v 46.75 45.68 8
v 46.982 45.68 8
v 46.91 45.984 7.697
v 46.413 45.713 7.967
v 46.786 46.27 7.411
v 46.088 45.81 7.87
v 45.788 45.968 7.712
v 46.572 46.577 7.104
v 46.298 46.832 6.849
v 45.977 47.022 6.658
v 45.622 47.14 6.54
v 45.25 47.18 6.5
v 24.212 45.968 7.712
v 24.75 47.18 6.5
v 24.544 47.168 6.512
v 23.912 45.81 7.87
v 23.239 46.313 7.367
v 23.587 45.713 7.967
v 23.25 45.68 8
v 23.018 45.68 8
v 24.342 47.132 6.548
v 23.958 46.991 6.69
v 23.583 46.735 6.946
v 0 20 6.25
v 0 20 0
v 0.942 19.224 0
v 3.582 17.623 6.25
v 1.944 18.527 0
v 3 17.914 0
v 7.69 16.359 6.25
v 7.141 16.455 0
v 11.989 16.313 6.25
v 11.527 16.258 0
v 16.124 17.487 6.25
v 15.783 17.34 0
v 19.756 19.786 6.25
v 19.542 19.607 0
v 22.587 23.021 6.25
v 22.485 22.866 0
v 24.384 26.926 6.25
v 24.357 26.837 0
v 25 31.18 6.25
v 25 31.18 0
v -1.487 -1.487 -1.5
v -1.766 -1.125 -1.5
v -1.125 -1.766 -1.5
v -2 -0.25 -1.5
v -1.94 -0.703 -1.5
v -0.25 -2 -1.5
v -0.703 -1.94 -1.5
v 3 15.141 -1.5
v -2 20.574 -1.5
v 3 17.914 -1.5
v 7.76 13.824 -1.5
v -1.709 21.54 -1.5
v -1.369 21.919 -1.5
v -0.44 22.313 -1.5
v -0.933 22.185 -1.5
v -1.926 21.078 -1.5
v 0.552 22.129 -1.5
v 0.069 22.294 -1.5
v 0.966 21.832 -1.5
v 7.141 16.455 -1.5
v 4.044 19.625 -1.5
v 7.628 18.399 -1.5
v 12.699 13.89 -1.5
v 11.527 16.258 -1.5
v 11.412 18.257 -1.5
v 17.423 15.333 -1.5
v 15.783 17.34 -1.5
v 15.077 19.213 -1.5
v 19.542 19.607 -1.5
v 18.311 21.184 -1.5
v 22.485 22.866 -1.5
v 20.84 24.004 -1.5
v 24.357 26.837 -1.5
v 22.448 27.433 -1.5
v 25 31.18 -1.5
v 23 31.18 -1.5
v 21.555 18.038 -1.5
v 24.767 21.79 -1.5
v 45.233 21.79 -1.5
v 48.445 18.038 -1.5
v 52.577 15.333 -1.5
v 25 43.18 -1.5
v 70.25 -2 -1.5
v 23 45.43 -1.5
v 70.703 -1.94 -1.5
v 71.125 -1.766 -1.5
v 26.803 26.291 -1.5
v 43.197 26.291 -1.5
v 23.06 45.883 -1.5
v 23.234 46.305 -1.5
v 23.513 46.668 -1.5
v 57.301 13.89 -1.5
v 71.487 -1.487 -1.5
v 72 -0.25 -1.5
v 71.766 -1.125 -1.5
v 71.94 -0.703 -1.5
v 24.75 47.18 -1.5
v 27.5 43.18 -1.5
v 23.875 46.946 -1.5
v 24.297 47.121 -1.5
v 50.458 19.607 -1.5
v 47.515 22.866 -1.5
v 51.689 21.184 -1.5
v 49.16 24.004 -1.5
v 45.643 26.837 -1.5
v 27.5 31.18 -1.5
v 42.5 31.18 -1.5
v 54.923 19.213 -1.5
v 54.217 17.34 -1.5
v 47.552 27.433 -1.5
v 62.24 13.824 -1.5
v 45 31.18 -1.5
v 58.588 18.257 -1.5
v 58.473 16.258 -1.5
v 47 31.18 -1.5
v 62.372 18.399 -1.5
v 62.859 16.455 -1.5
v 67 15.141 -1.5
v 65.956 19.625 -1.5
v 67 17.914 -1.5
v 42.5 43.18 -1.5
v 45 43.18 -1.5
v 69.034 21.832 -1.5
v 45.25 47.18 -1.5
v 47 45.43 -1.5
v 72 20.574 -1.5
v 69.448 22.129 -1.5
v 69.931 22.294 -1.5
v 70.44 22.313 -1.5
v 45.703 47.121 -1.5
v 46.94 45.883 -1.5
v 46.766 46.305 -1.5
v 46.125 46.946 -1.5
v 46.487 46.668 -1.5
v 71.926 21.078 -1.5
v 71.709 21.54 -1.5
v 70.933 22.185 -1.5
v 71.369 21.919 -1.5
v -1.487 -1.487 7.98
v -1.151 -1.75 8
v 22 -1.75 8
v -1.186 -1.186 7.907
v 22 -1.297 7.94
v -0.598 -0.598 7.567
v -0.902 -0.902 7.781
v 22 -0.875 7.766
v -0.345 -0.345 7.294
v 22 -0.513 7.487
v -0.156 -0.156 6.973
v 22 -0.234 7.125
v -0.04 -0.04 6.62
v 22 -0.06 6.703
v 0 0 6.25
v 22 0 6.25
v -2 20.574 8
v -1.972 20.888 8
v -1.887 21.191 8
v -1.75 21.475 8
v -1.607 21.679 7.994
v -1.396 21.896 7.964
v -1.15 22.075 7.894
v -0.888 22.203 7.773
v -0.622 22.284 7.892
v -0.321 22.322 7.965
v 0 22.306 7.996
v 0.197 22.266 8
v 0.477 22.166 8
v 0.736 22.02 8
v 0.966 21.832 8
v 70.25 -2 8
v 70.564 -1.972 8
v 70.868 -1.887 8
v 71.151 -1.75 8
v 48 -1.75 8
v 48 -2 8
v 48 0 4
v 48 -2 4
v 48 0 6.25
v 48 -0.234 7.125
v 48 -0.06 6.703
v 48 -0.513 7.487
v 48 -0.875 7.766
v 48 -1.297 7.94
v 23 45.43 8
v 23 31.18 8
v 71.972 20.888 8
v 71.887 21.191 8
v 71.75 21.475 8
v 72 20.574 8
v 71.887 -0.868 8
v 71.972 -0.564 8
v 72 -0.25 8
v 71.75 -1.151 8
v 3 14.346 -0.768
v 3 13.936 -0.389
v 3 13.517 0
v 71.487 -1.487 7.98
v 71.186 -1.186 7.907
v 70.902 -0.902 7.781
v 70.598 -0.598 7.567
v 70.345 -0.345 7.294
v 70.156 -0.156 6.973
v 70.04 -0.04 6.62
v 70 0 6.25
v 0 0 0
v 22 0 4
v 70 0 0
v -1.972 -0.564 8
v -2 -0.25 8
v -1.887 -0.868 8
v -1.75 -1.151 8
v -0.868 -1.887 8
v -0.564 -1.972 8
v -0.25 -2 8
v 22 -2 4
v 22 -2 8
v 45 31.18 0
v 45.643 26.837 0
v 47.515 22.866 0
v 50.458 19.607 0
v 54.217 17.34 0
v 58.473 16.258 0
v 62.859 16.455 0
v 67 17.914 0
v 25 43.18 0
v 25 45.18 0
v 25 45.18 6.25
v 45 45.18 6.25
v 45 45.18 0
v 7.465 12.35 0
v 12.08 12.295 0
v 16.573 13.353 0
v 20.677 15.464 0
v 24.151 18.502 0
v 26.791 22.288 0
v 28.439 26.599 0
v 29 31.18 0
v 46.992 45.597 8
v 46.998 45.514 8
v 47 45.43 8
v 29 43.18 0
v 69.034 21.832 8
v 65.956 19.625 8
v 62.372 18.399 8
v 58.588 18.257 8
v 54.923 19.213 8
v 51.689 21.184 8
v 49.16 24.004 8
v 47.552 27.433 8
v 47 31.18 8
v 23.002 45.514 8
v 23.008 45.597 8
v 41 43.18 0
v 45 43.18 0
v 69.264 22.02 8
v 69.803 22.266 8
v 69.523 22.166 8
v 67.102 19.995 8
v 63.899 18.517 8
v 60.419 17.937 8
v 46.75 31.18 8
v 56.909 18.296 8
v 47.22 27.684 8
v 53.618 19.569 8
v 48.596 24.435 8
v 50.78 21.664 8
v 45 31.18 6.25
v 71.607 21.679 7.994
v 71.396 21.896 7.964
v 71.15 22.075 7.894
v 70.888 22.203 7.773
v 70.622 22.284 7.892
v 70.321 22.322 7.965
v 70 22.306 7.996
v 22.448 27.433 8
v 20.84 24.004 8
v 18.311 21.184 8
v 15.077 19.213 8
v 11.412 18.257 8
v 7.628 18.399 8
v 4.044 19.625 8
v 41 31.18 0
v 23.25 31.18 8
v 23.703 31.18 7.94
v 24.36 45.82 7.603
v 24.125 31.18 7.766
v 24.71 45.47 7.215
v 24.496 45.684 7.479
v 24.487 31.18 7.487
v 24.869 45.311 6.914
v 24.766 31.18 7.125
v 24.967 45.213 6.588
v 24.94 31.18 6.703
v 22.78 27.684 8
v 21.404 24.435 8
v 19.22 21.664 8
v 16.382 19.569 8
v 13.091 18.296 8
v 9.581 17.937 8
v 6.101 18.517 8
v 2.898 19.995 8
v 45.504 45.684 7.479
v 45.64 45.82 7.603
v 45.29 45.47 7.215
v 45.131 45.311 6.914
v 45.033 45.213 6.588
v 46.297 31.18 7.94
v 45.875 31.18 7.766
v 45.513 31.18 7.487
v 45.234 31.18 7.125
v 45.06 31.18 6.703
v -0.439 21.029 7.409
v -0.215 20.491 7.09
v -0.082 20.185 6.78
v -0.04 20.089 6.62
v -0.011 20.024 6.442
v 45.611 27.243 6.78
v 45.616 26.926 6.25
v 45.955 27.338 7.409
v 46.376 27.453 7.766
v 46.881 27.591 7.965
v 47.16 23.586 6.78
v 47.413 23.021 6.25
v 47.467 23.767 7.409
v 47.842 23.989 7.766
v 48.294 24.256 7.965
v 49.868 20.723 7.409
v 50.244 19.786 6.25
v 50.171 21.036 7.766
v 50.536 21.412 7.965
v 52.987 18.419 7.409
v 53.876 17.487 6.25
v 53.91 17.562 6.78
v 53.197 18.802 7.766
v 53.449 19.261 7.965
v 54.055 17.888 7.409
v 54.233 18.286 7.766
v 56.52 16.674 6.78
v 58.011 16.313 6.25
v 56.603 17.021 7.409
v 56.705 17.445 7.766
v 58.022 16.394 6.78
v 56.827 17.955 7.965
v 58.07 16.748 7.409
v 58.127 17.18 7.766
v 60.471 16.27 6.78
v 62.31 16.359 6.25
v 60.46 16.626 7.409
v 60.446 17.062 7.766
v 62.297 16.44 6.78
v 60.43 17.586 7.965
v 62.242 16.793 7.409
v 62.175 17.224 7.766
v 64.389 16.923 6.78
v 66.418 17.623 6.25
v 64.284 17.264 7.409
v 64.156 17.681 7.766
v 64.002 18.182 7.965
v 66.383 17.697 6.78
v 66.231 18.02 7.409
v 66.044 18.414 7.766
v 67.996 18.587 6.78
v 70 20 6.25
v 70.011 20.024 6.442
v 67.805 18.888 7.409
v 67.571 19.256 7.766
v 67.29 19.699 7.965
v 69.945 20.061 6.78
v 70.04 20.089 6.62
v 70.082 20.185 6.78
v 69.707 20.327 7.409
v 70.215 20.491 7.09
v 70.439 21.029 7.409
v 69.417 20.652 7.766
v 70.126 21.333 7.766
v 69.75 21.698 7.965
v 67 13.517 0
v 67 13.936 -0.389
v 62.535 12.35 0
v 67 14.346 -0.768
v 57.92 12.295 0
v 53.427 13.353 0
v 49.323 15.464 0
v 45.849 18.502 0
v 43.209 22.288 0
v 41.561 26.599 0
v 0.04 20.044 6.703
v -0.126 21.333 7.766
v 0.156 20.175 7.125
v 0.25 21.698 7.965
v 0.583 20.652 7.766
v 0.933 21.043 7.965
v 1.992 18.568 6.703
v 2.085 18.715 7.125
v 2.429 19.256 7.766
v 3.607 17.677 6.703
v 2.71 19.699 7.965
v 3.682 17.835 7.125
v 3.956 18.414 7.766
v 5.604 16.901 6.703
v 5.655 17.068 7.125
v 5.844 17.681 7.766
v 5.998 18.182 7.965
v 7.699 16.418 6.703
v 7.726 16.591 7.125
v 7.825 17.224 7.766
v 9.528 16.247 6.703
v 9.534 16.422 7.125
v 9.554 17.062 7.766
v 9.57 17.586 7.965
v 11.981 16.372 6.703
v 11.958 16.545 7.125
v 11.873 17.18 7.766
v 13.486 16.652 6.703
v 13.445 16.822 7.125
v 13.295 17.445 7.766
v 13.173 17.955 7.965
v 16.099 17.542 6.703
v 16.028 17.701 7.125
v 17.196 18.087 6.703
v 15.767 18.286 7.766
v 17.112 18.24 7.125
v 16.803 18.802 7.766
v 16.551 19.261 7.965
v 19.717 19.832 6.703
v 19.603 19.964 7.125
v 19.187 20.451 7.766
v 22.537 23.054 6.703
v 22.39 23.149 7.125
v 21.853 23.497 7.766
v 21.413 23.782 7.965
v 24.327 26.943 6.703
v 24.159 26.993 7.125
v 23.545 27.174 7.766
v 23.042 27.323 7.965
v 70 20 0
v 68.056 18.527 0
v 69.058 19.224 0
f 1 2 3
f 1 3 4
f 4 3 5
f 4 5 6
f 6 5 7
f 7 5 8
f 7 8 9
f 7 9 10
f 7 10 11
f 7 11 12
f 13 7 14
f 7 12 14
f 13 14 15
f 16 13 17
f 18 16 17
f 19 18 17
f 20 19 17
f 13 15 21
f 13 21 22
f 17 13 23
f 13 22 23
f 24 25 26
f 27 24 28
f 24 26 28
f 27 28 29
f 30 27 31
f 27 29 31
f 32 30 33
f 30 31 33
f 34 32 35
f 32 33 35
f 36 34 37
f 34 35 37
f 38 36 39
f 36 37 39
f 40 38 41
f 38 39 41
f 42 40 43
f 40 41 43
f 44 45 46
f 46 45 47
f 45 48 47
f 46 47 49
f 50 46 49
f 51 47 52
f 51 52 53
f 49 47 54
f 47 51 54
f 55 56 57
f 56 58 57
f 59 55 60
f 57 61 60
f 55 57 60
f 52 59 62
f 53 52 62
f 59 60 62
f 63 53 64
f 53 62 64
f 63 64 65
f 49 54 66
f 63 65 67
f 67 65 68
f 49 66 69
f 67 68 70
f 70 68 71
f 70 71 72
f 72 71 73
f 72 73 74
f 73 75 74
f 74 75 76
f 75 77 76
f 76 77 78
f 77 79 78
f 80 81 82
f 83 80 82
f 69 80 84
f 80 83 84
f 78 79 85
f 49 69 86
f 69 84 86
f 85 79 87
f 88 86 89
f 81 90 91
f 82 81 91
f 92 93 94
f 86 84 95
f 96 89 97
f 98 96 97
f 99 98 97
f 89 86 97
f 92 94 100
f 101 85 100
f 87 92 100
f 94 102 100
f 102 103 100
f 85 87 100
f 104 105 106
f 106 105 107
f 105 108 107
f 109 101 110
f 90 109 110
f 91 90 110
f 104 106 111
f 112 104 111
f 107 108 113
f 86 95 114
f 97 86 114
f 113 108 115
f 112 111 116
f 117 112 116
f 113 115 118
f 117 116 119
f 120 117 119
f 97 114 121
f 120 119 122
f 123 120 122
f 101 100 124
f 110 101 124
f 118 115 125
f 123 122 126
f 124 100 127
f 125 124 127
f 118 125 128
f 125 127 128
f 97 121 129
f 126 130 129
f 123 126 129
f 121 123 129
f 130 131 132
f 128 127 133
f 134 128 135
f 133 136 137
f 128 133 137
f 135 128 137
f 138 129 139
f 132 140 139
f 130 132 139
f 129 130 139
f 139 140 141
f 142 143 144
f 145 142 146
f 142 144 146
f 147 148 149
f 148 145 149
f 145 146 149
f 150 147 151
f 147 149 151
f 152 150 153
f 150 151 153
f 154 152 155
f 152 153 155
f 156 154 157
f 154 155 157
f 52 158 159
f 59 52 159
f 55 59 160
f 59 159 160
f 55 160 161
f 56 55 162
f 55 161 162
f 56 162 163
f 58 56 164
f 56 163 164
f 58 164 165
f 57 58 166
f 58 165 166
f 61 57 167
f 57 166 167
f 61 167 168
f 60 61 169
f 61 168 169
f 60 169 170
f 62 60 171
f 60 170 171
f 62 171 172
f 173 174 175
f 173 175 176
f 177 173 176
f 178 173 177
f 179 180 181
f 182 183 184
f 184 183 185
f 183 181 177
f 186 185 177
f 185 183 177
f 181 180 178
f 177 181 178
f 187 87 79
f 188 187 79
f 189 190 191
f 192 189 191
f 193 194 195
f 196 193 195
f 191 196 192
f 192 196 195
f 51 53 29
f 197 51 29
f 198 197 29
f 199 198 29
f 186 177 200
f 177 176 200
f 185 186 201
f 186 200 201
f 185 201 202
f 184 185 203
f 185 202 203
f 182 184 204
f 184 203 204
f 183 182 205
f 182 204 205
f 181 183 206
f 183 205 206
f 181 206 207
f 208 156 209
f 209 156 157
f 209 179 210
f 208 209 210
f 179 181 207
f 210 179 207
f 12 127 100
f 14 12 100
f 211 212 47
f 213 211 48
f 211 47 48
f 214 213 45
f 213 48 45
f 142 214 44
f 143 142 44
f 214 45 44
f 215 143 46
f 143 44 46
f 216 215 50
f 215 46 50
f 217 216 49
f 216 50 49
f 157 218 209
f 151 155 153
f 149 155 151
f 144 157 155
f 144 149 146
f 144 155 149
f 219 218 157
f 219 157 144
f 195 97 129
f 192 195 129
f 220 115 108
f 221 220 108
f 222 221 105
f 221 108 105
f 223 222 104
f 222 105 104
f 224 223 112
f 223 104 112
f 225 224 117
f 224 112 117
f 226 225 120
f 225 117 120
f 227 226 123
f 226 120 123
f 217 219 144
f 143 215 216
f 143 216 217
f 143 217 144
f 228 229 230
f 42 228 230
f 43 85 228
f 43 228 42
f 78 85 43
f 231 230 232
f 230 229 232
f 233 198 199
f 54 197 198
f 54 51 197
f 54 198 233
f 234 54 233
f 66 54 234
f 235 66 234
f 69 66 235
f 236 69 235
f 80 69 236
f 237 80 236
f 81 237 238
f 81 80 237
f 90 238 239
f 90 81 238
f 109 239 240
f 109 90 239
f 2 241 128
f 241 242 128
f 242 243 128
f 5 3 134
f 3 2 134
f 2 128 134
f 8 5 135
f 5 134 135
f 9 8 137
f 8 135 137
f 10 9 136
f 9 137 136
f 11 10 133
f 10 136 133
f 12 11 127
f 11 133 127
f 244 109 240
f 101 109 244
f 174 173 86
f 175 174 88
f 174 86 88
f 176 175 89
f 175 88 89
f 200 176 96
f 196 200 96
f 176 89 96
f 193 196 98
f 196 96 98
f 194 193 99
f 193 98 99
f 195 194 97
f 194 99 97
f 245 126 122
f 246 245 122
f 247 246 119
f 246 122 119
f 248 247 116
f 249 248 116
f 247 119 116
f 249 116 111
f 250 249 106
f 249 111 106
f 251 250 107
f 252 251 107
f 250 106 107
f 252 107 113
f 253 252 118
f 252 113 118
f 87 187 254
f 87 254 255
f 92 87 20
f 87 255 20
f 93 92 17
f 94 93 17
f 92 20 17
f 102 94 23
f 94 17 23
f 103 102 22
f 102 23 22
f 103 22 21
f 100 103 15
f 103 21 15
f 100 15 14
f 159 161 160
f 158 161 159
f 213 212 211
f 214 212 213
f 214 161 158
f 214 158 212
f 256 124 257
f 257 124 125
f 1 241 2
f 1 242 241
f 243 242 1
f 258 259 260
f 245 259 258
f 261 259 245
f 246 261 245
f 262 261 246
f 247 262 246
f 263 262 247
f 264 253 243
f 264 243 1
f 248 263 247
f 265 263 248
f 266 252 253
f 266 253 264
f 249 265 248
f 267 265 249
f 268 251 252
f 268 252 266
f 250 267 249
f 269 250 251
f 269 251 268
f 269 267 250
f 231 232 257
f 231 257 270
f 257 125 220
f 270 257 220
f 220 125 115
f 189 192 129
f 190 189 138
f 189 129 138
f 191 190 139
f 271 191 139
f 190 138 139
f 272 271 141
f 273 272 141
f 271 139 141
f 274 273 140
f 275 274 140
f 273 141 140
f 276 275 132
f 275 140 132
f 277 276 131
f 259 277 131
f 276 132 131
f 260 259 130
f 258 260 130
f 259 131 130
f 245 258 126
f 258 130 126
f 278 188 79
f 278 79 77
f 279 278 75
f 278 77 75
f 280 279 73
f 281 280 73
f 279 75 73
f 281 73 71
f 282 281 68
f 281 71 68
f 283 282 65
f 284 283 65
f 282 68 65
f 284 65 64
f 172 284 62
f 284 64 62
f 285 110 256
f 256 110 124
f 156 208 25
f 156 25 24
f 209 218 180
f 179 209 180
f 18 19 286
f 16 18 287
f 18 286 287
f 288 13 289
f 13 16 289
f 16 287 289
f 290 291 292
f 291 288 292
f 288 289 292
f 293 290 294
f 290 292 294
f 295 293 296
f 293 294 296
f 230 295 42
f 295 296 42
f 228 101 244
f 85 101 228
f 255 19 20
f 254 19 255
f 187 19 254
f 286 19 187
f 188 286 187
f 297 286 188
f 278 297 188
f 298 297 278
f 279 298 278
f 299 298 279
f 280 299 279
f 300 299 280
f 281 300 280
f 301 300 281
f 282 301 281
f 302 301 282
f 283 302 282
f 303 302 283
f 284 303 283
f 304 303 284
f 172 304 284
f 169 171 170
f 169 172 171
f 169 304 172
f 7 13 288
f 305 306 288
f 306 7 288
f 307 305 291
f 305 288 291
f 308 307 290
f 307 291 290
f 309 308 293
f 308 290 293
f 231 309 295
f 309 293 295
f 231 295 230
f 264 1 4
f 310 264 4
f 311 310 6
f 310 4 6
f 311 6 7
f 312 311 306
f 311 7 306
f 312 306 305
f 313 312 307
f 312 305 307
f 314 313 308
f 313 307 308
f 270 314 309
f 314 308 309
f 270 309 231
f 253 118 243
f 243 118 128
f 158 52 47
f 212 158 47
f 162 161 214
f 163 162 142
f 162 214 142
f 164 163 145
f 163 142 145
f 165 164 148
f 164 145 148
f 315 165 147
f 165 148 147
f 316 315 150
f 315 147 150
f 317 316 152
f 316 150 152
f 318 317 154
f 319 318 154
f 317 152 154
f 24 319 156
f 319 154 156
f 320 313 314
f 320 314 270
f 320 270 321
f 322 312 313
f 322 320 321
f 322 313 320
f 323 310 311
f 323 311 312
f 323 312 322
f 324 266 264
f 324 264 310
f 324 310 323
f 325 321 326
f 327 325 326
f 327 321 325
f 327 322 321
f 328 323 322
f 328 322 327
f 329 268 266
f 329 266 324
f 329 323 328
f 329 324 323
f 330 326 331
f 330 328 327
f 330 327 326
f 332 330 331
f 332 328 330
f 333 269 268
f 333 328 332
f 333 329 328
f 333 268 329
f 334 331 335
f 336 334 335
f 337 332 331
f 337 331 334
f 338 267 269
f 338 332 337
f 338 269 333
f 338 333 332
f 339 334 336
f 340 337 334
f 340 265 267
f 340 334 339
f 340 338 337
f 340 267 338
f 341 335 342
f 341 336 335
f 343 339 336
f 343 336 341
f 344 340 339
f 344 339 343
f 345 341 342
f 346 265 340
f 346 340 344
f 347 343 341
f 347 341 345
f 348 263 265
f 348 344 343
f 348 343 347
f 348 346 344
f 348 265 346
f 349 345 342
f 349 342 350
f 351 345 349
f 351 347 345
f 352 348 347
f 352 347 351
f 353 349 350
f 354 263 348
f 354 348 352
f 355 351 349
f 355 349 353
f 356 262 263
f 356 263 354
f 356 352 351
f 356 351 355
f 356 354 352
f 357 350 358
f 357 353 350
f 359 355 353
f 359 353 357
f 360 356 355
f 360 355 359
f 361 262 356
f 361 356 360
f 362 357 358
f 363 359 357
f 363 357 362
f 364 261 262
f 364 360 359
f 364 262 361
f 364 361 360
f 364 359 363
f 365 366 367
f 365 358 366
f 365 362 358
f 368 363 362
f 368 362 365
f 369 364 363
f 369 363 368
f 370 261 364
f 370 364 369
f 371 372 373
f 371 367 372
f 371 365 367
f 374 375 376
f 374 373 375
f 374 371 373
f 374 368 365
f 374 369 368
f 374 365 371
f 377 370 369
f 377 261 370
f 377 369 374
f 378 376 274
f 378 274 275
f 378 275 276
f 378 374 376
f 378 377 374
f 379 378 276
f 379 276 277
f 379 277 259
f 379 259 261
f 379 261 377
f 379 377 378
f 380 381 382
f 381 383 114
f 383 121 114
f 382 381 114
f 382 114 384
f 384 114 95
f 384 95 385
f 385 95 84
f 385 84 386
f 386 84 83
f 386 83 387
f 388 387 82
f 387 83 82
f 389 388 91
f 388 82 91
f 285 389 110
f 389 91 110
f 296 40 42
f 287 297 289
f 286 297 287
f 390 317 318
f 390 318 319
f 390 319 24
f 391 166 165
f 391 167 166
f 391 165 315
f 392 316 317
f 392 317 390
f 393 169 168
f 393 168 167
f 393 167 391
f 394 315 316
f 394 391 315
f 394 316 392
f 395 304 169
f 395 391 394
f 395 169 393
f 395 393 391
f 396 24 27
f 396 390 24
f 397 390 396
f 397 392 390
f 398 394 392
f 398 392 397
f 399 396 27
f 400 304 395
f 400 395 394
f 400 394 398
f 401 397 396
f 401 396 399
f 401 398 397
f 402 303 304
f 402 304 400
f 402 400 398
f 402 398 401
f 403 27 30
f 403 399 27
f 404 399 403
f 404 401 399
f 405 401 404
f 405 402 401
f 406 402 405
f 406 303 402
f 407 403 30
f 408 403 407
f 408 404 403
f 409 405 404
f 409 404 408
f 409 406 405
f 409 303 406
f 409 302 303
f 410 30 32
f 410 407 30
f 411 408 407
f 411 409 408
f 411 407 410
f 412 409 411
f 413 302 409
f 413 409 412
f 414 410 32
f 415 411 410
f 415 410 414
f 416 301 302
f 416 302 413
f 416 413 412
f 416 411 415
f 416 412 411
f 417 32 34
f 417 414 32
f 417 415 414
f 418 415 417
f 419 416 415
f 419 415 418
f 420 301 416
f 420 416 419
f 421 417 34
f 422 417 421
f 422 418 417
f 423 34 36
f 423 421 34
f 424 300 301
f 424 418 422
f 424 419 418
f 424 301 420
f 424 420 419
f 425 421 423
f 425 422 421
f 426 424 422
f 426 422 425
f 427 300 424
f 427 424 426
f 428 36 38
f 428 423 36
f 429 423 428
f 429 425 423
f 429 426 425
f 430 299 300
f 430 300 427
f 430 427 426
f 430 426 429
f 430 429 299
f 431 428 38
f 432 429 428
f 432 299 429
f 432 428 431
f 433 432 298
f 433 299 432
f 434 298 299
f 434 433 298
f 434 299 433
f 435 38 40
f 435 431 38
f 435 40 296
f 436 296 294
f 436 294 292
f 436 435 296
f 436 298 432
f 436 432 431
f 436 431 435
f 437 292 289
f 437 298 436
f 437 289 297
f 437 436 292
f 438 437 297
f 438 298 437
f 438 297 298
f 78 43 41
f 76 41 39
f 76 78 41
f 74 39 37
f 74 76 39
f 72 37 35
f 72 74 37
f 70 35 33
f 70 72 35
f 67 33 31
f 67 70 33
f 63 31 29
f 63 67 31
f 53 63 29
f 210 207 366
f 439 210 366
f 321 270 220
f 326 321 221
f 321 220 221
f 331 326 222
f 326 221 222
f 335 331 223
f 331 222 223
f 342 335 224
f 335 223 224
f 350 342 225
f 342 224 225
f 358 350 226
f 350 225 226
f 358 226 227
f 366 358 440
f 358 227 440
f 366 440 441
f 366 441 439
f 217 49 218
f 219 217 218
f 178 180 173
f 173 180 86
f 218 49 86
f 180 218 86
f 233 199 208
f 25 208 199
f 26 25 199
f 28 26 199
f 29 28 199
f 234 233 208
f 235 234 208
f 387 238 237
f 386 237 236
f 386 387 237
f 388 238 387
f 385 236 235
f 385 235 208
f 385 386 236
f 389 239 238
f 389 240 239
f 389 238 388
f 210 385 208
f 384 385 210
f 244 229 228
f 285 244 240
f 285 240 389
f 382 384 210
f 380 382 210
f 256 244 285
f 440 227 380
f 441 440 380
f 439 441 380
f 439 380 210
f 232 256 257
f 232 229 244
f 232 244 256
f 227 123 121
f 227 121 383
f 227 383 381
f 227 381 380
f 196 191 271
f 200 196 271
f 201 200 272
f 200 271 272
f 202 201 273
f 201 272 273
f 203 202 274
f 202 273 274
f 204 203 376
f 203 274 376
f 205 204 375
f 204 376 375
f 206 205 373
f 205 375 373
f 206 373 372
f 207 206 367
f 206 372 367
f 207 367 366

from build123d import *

# Parameters (mm, degrees)
BOSS_EXTRUDE1_DEPTH = 8
BOSS_EXTRUDE2_START = 1.5
BOSS_EXTRUDE2_DEPTH = 1.5
CHAMFER1_SIZE       = 1.5
CHAMFER2_SIZE       = 1.5
FILLET1_R           = 1.75
CUT_EXTRUDE1_REACH  = 89.56
SKETCH3_W           = 26
SKETCH3_H           = 4


# Some blends are built 0.0001 mm under size
with BuildPart() as part:
    # Sketch1 → Boss-Extrude1 (new body)
    with BuildSketch(Plane(origin=(0, 0, 0), x_dir=(-1, 0, 0), z_dir=(0, 0, 1))):
        with BuildLine():
            Line((2, 2), (-72, 2))
            Line((-72, 2), (-72, -26.180339887))
            ThreePointArc((-72, -26.180339887), (-57.450490243, -18.432791104), (-47, -31.180339887))
            Line((-47, -31.180339887), (-47, -47.180339887))
            Line((-47, -47.180339887), (-23, -47.180339887))
            Line((-23, -47.180339887), (-23, -31.180339887))
            ThreePointArc((-23, -31.180339887), (-12.549509757, -18.432791104), (2, -26.180339887))
            Line((2, -26.180339887), (2, 2))
        make_face()
        with BuildLine():
            Line((-70, 0), (0, 0))
            Line((0, 0), (0, -20))
            ThreePointArc((0, -20), (-16.123724357, -17.48727595), (-25, -31.180339887))
            Line((-25, -31.180339887), (-25, -45.180339887))
            Line((-25, -45.180339887), (-45, -45.180339887))
            Line((-45, -45.180339887), (-45, -31.180339887))
            ThreePointArc((-45, -31.180339887), (-53.876275643, -17.48727595), (-70, -20))
            Line((-70, -20), (-70, 0))
        make_face(mode=Mode.SUBTRACT)
    extrude(amount=BOSS_EXTRUDE1_DEPTH)

    # Sketch2 → Boss-Extrude2 (add)
    with BuildSketch(Plane(origin=(0, 0, 0), x_dir=(-1, 0, 0), z_dir=(0, 0, -1)).offset(BOSS_EXTRUDE2_START)):
        with BuildLine():
            Line((2, -2), (-72, -2))
            Line((-72, -2), (-72, 26.180339887))
            ThreePointArc((-72, 26.180339887), (-57.450490243, 18.432791104), (-47, 31.180339887))
            Line((-47, 31.180339887), (-47, 47.180339887))
            Line((-47, 47.180339887), (-23, 47.180339887))
            Line((-23, 47.180339887), (-23, 31.180339887))
            ThreePointArc((-23, 31.180339887), (-12.549509757, 18.432791104), (2, 26.180339887))
            Line((2, 26.180339887), (2, -2))
        make_face()
        with BuildLine():
            Line((-3, 17.913840726), (-3, 15.141324955))
            ThreePointArc((-3, 15.141324955), (-19.585144756, 16.538789423), (-27.5, 31.180339887))
            Line((-27.5, 31.180339887), (-27.5, 43.180339887))
            Line((-27.5, 43.180339887), (-25, 43.180339887))
            Line((-25, 43.180339887), (-25, 31.180339887))
            ThreePointArc((-25, 31.180339887), (-17.745966692, 18.335107309), (-3, 17.913840726))
        make_face(mode=Mode.SUBTRACT)
        with BuildLine():
            Line((-67, 17.913840726), (-67, 15.141324955))
            ThreePointArc((-67, 15.141324955), (-50.414855244, 16.538789423), (-42.5, 31.180339887))
            Line((-42.5, 31.180339887), (-42.5, 43.180339887))
            Line((-42.5, 43.180339887), (-45, 43.180339887))
            Line((-45, 43.180339887), (-45, 31.180339887))
            ThreePointArc((-45, 31.180339887), (-52.254033308, 18.335107309), (-67, 17.913840726))
        make_face(mode=Mode.SUBTRACT)
    extrude(amount=-BOSS_EXTRUDE2_DEPTH)

    # Chamfer1
    chamfer1_edges = [part.edges().sort_by_distance(p)[0] for p in [
        (42.5, 37.180339887, 0),
        (50.414855244, 16.538789423, 0),
        (27.5, 37.180339887, 0),
        (19.585144756, 16.538789423, 0),
    ]]
    chamfer(chamfer1_edges, length=CHAMFER1_SIZE - 0.0001)  # a hair under: the kernel refuses the full size

    # Chamfer2
    chamfer2_edges = [part.edges().sort_by_distance(p)[0] for p in [
        (35, 47.180339887, 8),
    ]]
    chamfer(chamfer2_edges, length=CHAMFER2_SIZE)

    # Fillet1
    # the kernel refuses this fillet: 1.75 mm, written as the material it takes off along each edge
    with BuildSketch(Plane(origin=(10, 31.180339887, 8), x_dir=(-0.8529681786661586, -0.5219629164825181, 0), z_dir=(-0.5219629164825181, 0.8529681786661586, 0))) as fillet1_piece_1_section:
        with BuildLine():
            CenterArc((15 - FILLET1_R, -FILLET1_R), FILLET1_R, 0, 90)
            Line((15, -FILLET1_R), (15 + FILLET1_R * 0.02, -FILLET1_R))
            Line((15 + FILLET1_R * 0.02, -FILLET1_R), (15 + FILLET1_R * 0.02, FILLET1_R * 0.02))
            Line((15 + FILLET1_R * 0.02, FILLET1_R * 0.02), (15 - FILLET1_R, FILLET1_R * 0.02))
            Line((15 - FILLET1_R, FILLET1_R * 0.02), (15 - FILLET1_R, 0))
        make_face()
    fillet1_piece_1 = revolve(axis=Axis((10, 31.180339887, 8), (0, 0, 1)), revolution_arc=148.535987608, mode=Mode.PRIVATE)
    fillet1_piece_1 = split(fillet1_piece_1, bisect_by=Plane(origin=(0, 17.590580618, 7.50852365), z_dir=(1, 0, 0)), keep=Keep.TOP, mode=Mode.PRIVATE)
    add(fillet1_piece_1, mode=Mode.SUBTRACT)
    with BuildSketch(Plane(origin=(0, 0, 8), x_dir=(-1, 0, 0), z_dir=(0, 1, 0))) as fillet1_piece_2_section:
        with BuildLine():
            CenterArc((FILLET1_R, -FILLET1_R), FILLET1_R, 90, 90)
            Line((0, -FILLET1_R), (-FILLET1_R * 0.02, -FILLET1_R))
            Line((-FILLET1_R * 0.02, -FILLET1_R), (-FILLET1_R * 0.02, FILLET1_R * 0.02))
            Line((-FILLET1_R * 0.02, FILLET1_R * 0.02), (FILLET1_R, FILLET1_R * 0.02))
            Line((FILLET1_R, FILLET1_R * 0.02), (FILLET1_R, 0))
        make_face()
    fillet1_piece_2 = extrude(amount=24.375, mode=Mode.PRIVATE)
    fillet1_piece_2 = fillet1_piece_2 - Plane(origin=(10, 31.180339887, 7.607877329), x_dir=(-0.6666666666666653, -0.7453559924999311, 0), z_dir=(0, 0, -1)) * Cylinder(15, 56, mode=Mode.PRIVATE)
    add(fillet1_piece_2, mode=Mode.SUBTRACT)
    with BuildSketch(Plane(origin=(25, 31.180339887, 8), x_dir=(-1, 0, 0), z_dir=(0, 1, 0)), Plane(origin=(45, 45.180339887, 8), x_dir=(1, 0, 0), z_dir=(0, -1, 0))) as fillet1_piece_3:
        with BuildLine():
            CenterArc((FILLET1_R, -FILLET1_R), FILLET1_R, 90, 90)
            Line((0, -FILLET1_R), (-FILLET1_R * 0.02, -FILLET1_R))
            Line((-FILLET1_R * 0.02, -FILLET1_R), (-FILLET1_R * 0.02, FILLET1_R * 0.02))
            Line((-FILLET1_R * 0.02, FILLET1_R * 0.02), (FILLET1_R, FILLET1_R * 0.02))
            Line((FILLET1_R, FILLET1_R * 0.02), (FILLET1_R, 0))
        make_face()
    extrude(amount=14, mode=Mode.SUBTRACT)
    with BuildSketch(Plane(origin=(70, 0, 8), x_dir=(0, -1, 0), z_dir=(-1, 0, 0))) as fillet1_piece_4:
        with BuildLine():
            CenterArc((FILLET1_R, -FILLET1_R), FILLET1_R, 90, 90)
            Line((0, -FILLET1_R), (-FILLET1_R * 0.02, -FILLET1_R))
            Line((-FILLET1_R * 0.02, -FILLET1_R), (-FILLET1_R * 0.02, FILLET1_R * 0.02))
            Line((-FILLET1_R * 0.02, FILLET1_R * 0.02), (FILLET1_R, FILLET1_R * 0.02))
            Line((FILLET1_R, FILLET1_R * 0.02), (FILLET1_R, 0))
        make_face()
    extrude(amount=70, mode=Mode.SUBTRACT)
    with BuildSketch(Plane(origin=(70, 24.375, 8), x_dir=(1, 0, 0), z_dir=(0, -1, 0))) as fillet1_piece_5_section:
        with BuildLine():
            CenterArc((FILLET1_R, -FILLET1_R), FILLET1_R, 90, 90)
            Line((0, -FILLET1_R), (-FILLET1_R * 0.02, -FILLET1_R))
            Line((-FILLET1_R * 0.02, -FILLET1_R), (-FILLET1_R * 0.02, FILLET1_R * 0.02))
            Line((-FILLET1_R * 0.02, FILLET1_R * 0.02), (FILLET1_R, FILLET1_R * 0.02))
            Line((FILLET1_R, FILLET1_R * 0.02), (FILLET1_R, 0))
        make_face()
    fillet1_piece_5 = extrude(amount=24.375, mode=Mode.PRIVATE)
    fillet1_piece_5 = fillet1_piece_5 - Plane(origin=(60, 31.180339887, 7.607877375), x_dir=(-1, 0, 0), z_dir=(0, 0, -1)) * Cylinder(15, 56, mode=Mode.PRIVATE)
    add(fillet1_piece_5, mode=Mode.SUBTRACT)
    with BuildSketch(Plane(origin=(60, 31.180339887, 8), x_dir=(-1, 0, 0), z_dir=(0, 1, 0))) as fillet1_piece_6_section:
        with BuildLine():
            CenterArc((15 - FILLET1_R, -FILLET1_R), FILLET1_R, 0, 90)
            Line((15, -FILLET1_R), (15 + FILLET1_R * 0.02, -FILLET1_R))
            Line((15 + FILLET1_R * 0.02, -FILLET1_R), (15 + FILLET1_R * 0.02, FILLET1_R * 0.02))
            Line((15 + FILLET1_R * 0.02, FILLET1_R * 0.02), (15 - FILLET1_R, FILLET1_R * 0.02))
            Line((15 - FILLET1_R, FILLET1_R * 0.02), (15 - FILLET1_R, 0))
        make_face()
    fillet1_piece_6 = revolve(axis=Axis((60, 31.180339887, 8), (0, 0, 1)), revolution_arc=148.535987608, mode=Mode.PRIVATE)
    fillet1_piece_6 = split(fillet1_piece_6, bisect_by=Plane(origin=(70, 17.590580683, 7.508523582), z_dir=(-1, 0, 0)), keep=Keep.TOP, mode=Mode.PRIVATE)
    add(fillet1_piece_6, mode=Mode.SUBTRACT)
    with BuildSketch(Plane(origin=(25, 45.180339887, 8), x_dir=(0, 1, 0), z_dir=(1, 0, 0))) as fillet1_piece_7:
        with BuildLine():
            CenterArc((FILLET1_R, -FILLET1_R), FILLET1_R, 90, 90)
            Line((0, -FILLET1_R), (-FILLET1_R * 0.02, -FILLET1_R))
            Line((-FILLET1_R * 0.02, -FILLET1_R), (-FILLET1_R * 0.02, FILLET1_R * 0.02))
            Line((-FILLET1_R * 0.02, FILLET1_R * 0.02), (FILLET1_R, FILLET1_R * 0.02))
            Line((FILLET1_R, FILLET1_R * 0.02), (FILLET1_R, 0))
        make_face()
    extrude(amount=20, mode=Mode.SUBTRACT)
    with BuildSketch(Plane(origin=(72, 26.180339887, -1.5), x_dir=(-0.5635217270596511, -0.8261012426644256, 0), z_dir=(0, 0, 1)), Plane(origin=(-2, 26.180339887, 8), x_dir=(0.5635217270596506, -0.8261012426644259, 0), z_dir=(0, 0, -1))) as fillet1_piece_8:
        with BuildLine():
            CenterArc((5.617783669, 1.713764708), FILLET1_R, 124.299700248, 134.020464453)
            Line((4.631620646, 3.159441883), (4.611897386, 3.188355426))
            Line((4.611897386, 3.188355426), (-0.01972326, 0.028913543))
            Line((-0.01972326, 0.028913543), (0.007085493, -0.034275294))
            ThreePointArc((0.007085493, -0.034275294), (2.631754511, 0.234176453), (5.25642353, -0.034275294))
            Line((5.25642353, -0.034275294), (5.263509023, 0))
        make_face()
    extrude(amount=9.5, mode=Mode.SUBTRACT)
    with BuildSketch(Plane(origin=(72, -2, -1.5), x_dir=(0, 1, 0), z_dir=(0, 0, 1)), Plane(origin=(-2, -2, -1.5), x_dir=(1, 0, 0), z_dir=(0, 0, 1))) as fillet1_piece_9:
        with BuildLine():
            CenterArc((FILLET1_R, FILLET1_R), FILLET1_R, 180, 90)
            Line((0, FILLET1_R), (-FILLET1_R * 0.02, FILLET1_R))
            Line((-FILLET1_R * 0.02, FILLET1_R), (-FILLET1_R * 0.02, -FILLET1_R * 0.02))
            Line((-FILLET1_R * 0.02, -FILLET1_R * 0.02), (FILLET1_R, -FILLET1_R * 0.02))
            Line((FILLET1_R, -FILLET1_R * 0.02), (FILLET1_R, 0))
        make_face()
    extrude(amount=9.5, mode=Mode.SUBTRACT)
    with BuildSketch(Plane(origin=(47, 47.180339887, -1.5), x_dir=(0, -1, 0), z_dir=(0, 0, 1))) as fillet1_piece_10_section:
        with BuildLine():
            CenterArc((FILLET1_R, -FILLET1_R), FILLET1_R, 90, 90)
            Line((0, -FILLET1_R), (-FILLET1_R * 0.02, -FILLET1_R))
            Line((-FILLET1_R * 0.02, -FILLET1_R), (-FILLET1_R * 0.02, FILLET1_R * 0.02))
            Line((-FILLET1_R * 0.02, FILLET1_R * 0.02), (FILLET1_R, FILLET1_R * 0.02))
            Line((FILLET1_R, FILLET1_R * 0.02), (FILLET1_R, 0))
        make_face()
    fillet1_piece_10 = extrude(amount=12.375, mode=Mode.PRIVATE)
    fillet1_piece_10 = split(fillet1_piece_10, bisect_by=Plane(origin=(46.61382335, 48.870482081, 4.809857807), z_dir=(0, -0.7071067811865476, -0.7071067811865476)), keep=Keep.TOP, mode=Mode.PRIVATE)
    add(fillet1_piece_10, mode=Mode.SUBTRACT)
    with BuildSketch(Plane(origin=(23, 47.180339887, 10.875), x_dir=(0, -1, 0), z_dir=(0, 0, -1))) as fillet1_piece_11_section:
        with BuildLine():
            CenterArc((FILLET1_R, -FILLET1_R), FILLET1_R, 90, 90)
            Line((0, -FILLET1_R), (-FILLET1_R * 0.02, -FILLET1_R))
            Line((-FILLET1_R * 0.02, -FILLET1_R), (-FILLET1_R * 0.02, FILLET1_R * 0.02))
            Line((-FILLET1_R * 0.02, FILLET1_R * 0.02), (FILLET1_R, FILLET1_R * 0.02))
            Line((FILLET1_R, FILLET1_R * 0.02), (FILLET1_R, 0))
        make_face()
    fillet1_piece_11 = extrude(amount=12.375, mode=Mode.PRIVATE)
    fillet1_piece_11 = split(fillet1_piece_11, bisect_by=Plane(origin=(23.38617665, 48.870482081, 4.809857807), z_dir=(0, -0.7071067811865476, -0.7071067811865476)), keep=Keep.TOP, mode=Mode.PRIVATE)
    add(fillet1_piece_11, mode=Mode.SUBTRACT)
    with BuildSketch(Plane(origin=(0, 0, 8), x_dir=(-1, 0, 0), z_dir=(0, 1, 0))) as fillet1_piece_12a_section:
        with BuildLine():
            CenterArc((FILLET1_R, -FILLET1_R), FILLET1_R, 90, 90)
            Line((0, -FILLET1_R), (-FILLET1_R * 0.02, -FILLET1_R))
            Line((-FILLET1_R * 0.02, -FILLET1_R), (-FILLET1_R * 0.02, FILLET1_R * 0.02))
            Line((-FILLET1_R * 0.02, FILLET1_R * 0.02), (FILLET1_R, FILLET1_R * 0.02))
            Line((FILLET1_R, FILLET1_R * 0.02), (FILLET1_R, 0))
        make_face()
    fillet1_piece_12a = extrude(amount=24.375, mode=Mode.PRIVATE)
    fillet1_piece_12a = fillet1_piece_12a & Plane(origin=(10, 31.180339887, 7.583047858), x_dir=(-0.6666666666666653, -0.7453559924999311, 0), z_dir=(0, 0, -1)) * Cylinder(15, 56, mode=Mode.PRIVATE)
    with BuildSketch(Plane(origin=(10, 31.180339887, 8), x_dir=(-0.8529681786661586, -0.5219629164825181, 0), z_dir=(-0.5219629164825181, 0.8529681786661586, 0))) as fillet1_piece_12b_section:
        with BuildLine():
            CenterArc((15 - FILLET1_R, -FILLET1_R), FILLET1_R, 0, 90)
            Line((15, -FILLET1_R), (15 + FILLET1_R * 0.02, -FILLET1_R))
            Line((15 + FILLET1_R * 0.02, -FILLET1_R), (15 + FILLET1_R * 0.02, FILLET1_R * 0.02))
            Line((15 + FILLET1_R * 0.02, FILLET1_R * 0.02), (15 - FILLET1_R, FILLET1_R * 0.02))
            Line((15 - FILLET1_R, FILLET1_R * 0.02), (15 - FILLET1_R, 0))
        make_face()
    fillet1_piece_12b = revolve(axis=Axis((10, 31.180339887, 8), (0, 0, 1)), revolution_arc=148.535987608, mode=Mode.PRIVATE)
    fillet1_piece_12b = split(fillet1_piece_12b, bisect_by=Plane(origin=(0, 21.951360375, 7.57760015), z_dir=(-1, 0, 0)), keep=Keep.TOP, mode=Mode.PRIVATE)
    fillet1_piece_12 = fillet1_piece_12a & fillet1_piece_12b
    add(fillet1_piece_12, mode=Mode.SUBTRACT)
    with BuildSketch(Plane(origin=(70, 0, 8), x_dir=(0, -1, 0), z_dir=(-1, 0, 0))) as fillet1_piece_13a_section:
        with BuildLine():
            CenterArc((FILLET1_R, -FILLET1_R), FILLET1_R, 90, 90)
            Line((0, -FILLET1_R), (-FILLET1_R * 0.02, -FILLET1_R))
            Line((-FILLET1_R * 0.02, -FILLET1_R), (-FILLET1_R * 0.02, FILLET1_R * 0.02))
            Line((-FILLET1_R * 0.02, FILLET1_R * 0.02), (FILLET1_R, FILLET1_R * 0.02))
            Line((FILLET1_R, FILLET1_R * 0.02), (FILLET1_R, 0))
        make_face()
    fillet1_piece_13a = extrude(amount=74.375, mode=Mode.PRIVATE)
    fillet1_piece_13a = split(fillet1_piece_13a, bisect_by=Plane(origin=(0, -0.39619145, 7.60380855), z_dir=(-1, 0, 0)), keep=Keep.TOP, mode=Mode.PRIVATE)
    with BuildSketch(Plane(origin=(0, -4.375, 8), x_dir=(-1, 0, 0), z_dir=(0, 1, 0))) as fillet1_piece_13b_section:
        with BuildLine():
            CenterArc((FILLET1_R, -FILLET1_R), FILLET1_R, 90, 90)
            Line((0, -FILLET1_R), (-FILLET1_R * 0.02, -FILLET1_R))
            Line((-FILLET1_R * 0.02, -FILLET1_R), (-FILLET1_R * 0.02, FILLET1_R * 0.02))
            Line((-FILLET1_R * 0.02, FILLET1_R * 0.02), (FILLET1_R, FILLET1_R * 0.02))
            Line((FILLET1_R, FILLET1_R * 0.02), (FILLET1_R, 0))
        make_face()
    fillet1_piece_13b = extrude(amount=28.75, mode=Mode.PRIVATE)
    fillet1_piece_13b = split(fillet1_piece_13b, bisect_by=Plane(origin=(-0.39619145, 0, 7.60380855), z_dir=(0, -1, 0)), keep=Keep.TOP, mode=Mode.PRIVATE)
    fillet1_piece_13 = fillet1_piece_13a & fillet1_piece_13b
    add(fillet1_piece_13, mode=Mode.SUBTRACT)
    with BuildSketch(Plane(origin=(25, 31.180339887, 8), x_dir=(-1, 0, 0), z_dir=(0, 1, 0))) as fillet1_piece_14a_section:
        with BuildLine():
            CenterArc((FILLET1_R, -FILLET1_R), FILLET1_R, 90, 90)
            Line((0, -FILLET1_R), (-FILLET1_R * 0.02, -FILLET1_R))
            Line((-FILLET1_R * 0.02, -FILLET1_R), (-FILLET1_R * 0.02, FILLET1_R * 0.02))
            Line((-FILLET1_R * 0.02, FILLET1_R * 0.02), (FILLET1_R, FILLET1_R * 0.02))
            Line((FILLET1_R, FILLET1_R * 0.02), (FILLET1_R, 0))
        make_face()
    fillet1_piece_14a = extrude(amount=18.375, mode=Mode.PRIVATE)
    fillet1_piece_14a = split(fillet1_piece_14a, bisect_by=Plane(origin=(24.60380855, 45.180339887, 7.60380855), z_dir=(0, 1, 0)), keep=Keep.TOP, mode=Mode.PRIVATE)
    with BuildSketch(Plane(origin=(20.625, 45.180339887, 8), x_dir=(0, 1, 0), z_dir=(1, 0, 0))) as fillet1_piece_14b_section:
        with BuildLine():
            CenterArc((FILLET1_R, -FILLET1_R), FILLET1_R, 90, 90)
            Line((0, -FILLET1_R), (-FILLET1_R * 0.02, -FILLET1_R))
            Line((-FILLET1_R * 0.02, -FILLET1_R), (-FILLET1_R * 0.02, FILLET1_R * 0.02))
            Line((-FILLET1_R * 0.02, FILLET1_R * 0.02), (FILLET1_R, FILLET1_R * 0.02))
            Line((FILLET1_R, FILLET1_R * 0.02), (FILLET1_R, 0))
        make_face()
    fillet1_piece_14b = extrude(amount=24.375, mode=Mode.PRIVATE)
    fillet1_piece_14b = split(fillet1_piece_14b, bisect_by=Plane(origin=(25, 45.576531337, 7.60380855), z_dir=(-1, 0, 0)), keep=Keep.TOP, mode=Mode.PRIVATE)
    fillet1_piece_14 = fillet1_piece_14a & fillet1_piece_14b
    add(fillet1_piece_14, mode=Mode.SUBTRACT)
    with BuildSketch(Plane(origin=(70, 24.375, 8), x_dir=(1, 0, 0), z_dir=(0, -1, 0))) as fillet1_piece_15a_section:
        with BuildLine():
            CenterArc((FILLET1_R, -FILLET1_R), FILLET1_R, 90, 90)
            Line((0, -FILLET1_R), (-FILLET1_R * 0.02, -FILLET1_R))
            Line((-FILLET1_R * 0.02, -FILLET1_R), (-FILLET1_R * 0.02, FILLET1_R * 0.02))
            Line((-FILLET1_R * 0.02, FILLET1_R * 0.02), (FILLET1_R, FILLET1_R * 0.02))
            Line((FILLET1_R, FILLET1_R * 0.02), (FILLET1_R, 0))
        make_face()
    fillet1_piece_15a = extrude(amount=28.75, mode=Mode.PRIVATE)
    fillet1_piece_15a = split(fillet1_piece_15a, bisect_by=Plane(origin=(70.39619145, 0, 7.60380855), z_dir=(0, -1, 0)), keep=Keep.TOP, mode=Mode.PRIVATE)
    with BuildSketch(Plane(origin=(74.375, 0, 8), x_dir=(0, -1, 0), z_dir=(-1, 0, 0))) as fillet1_piece_15b_section:
        with BuildLine():
            CenterArc((FILLET1_R, -FILLET1_R), FILLET1_R, 90, 90)
            Line((0, -FILLET1_R), (-FILLET1_R * 0.02, -FILLET1_R))
            Line((-FILLET1_R * 0.02, -FILLET1_R), (-FILLET1_R * 0.02, FILLET1_R * 0.02))
            Line((-FILLET1_R * 0.02, FILLET1_R * 0.02), (FILLET1_R, FILLET1_R * 0.02))
            Line((FILLET1_R, FILLET1_R * 0.02), (FILLET1_R, 0))
        make_face()
    fillet1_piece_15b = extrude(amount=74.375, mode=Mode.PRIVATE)
    fillet1_piece_15b = split(fillet1_piece_15b, bisect_by=Plane(origin=(70, -0.39619145, 7.60380855), z_dir=(1, 0, 0)), keep=Keep.TOP, mode=Mode.PRIVATE)
    fillet1_piece_15 = fillet1_piece_15a & fillet1_piece_15b
    add(fillet1_piece_15, mode=Mode.SUBTRACT)
    with BuildSketch(Plane(origin=(70, 24.375, 8), x_dir=(1, 0, 0), z_dir=(0, -1, 0))) as fillet1_piece_16a_section:
        with BuildLine():
            CenterArc((FILLET1_R, -FILLET1_R), FILLET1_R, 90, 90)
            Line((0, -FILLET1_R), (-FILLET1_R * 0.02, -FILLET1_R))
            Line((-FILLET1_R * 0.02, -FILLET1_R), (-FILLET1_R * 0.02, FILLET1_R * 0.02))
            Line((-FILLET1_R * 0.02, FILLET1_R * 0.02), (FILLET1_R, FILLET1_R * 0.02))
            Line((FILLET1_R, FILLET1_R * 0.02), (FILLET1_R, 0))
        make_face()
    fillet1_piece_16a = extrude(amount=24.375, mode=Mode.PRIVATE)
    fillet1_piece_16a = fillet1_piece_16a & Plane(origin=(60, 31.180339887, 7.583047884), x_dir=(-1, 0, 0), z_dir=(0, 0, -1)) * Cylinder(15, 56, mode=Mode.PRIVATE)
    with BuildSketch(Plane(origin=(60, 31.180339887, 8), x_dir=(-1, 0, 0), z_dir=(0, 1, 0))) as fillet1_piece_16b_section:
        with BuildLine():
            CenterArc((15 - FILLET1_R, -FILLET1_R), FILLET1_R, 0, 90)
            Line((15, -FILLET1_R), (15 + FILLET1_R * 0.02, -FILLET1_R))
            Line((15 + FILLET1_R * 0.02, -FILLET1_R), (15 + FILLET1_R * 0.02, FILLET1_R * 0.02))
            Line((15 + FILLET1_R * 0.02, FILLET1_R * 0.02), (15 - FILLET1_R, FILLET1_R * 0.02))
            Line((15 - FILLET1_R, FILLET1_R * 0.02), (15 - FILLET1_R, 0))
        make_face()
    fillet1_piece_16b = revolve(axis=Axis((60, 31.180339887, 8), (0, 0, 1)), revolution_arc=148.535987608, mode=Mode.PRIVATE)
    fillet1_piece_16b = split(fillet1_piece_16b, bisect_by=Plane(origin=(70, 21.951360527, 7.577600104), z_dir=(1, 0, 0)), keep=Keep.TOP, mode=Mode.PRIVATE)
    fillet1_piece_16 = fillet1_piece_16a & fillet1_piece_16b
    add(fillet1_piece_16, mode=Mode.SUBTRACT)
    with BuildSketch(Plane(origin=(25, 45.180339887, 8), x_dir=(0, 1, 0), z_dir=(1, 0, 0))) as fillet1_piece_17a_section:
        with BuildLine():
            CenterArc((FILLET1_R, -FILLET1_R), FILLET1_R, 90, 90)
            Line((0, -FILLET1_R), (-FILLET1_R * 0.02, -FILLET1_R))
            Line((-FILLET1_R * 0.02, -FILLET1_R), (-FILLET1_R * 0.02, FILLET1_R * 0.02))
            Line((-FILLET1_R * 0.02, FILLET1_R * 0.02), (FILLET1_R, FILLET1_R * 0.02))
            Line((FILLET1_R, FILLET1_R * 0.02), (FILLET1_R, 0))
        make_face()
    fillet1_piece_17a = extrude(amount=24.375, mode=Mode.PRIVATE)
    fillet1_piece_17a = split(fillet1_piece_17a, bisect_by=Plane(origin=(45, 45.576531337, 7.60380855), z_dir=(1, 0, 0)), keep=Keep.TOP, mode=Mode.PRIVATE)
    with BuildSketch(Plane(origin=(45, 49.555339887, 8), x_dir=(1, 0, 0), z_dir=(0, -1, 0))) as fillet1_piece_17b_section:
        with BuildLine():
            CenterArc((FILLET1_R, -FILLET1_R), FILLET1_R, 90, 90)
            Line((0, -FILLET1_R), (-FILLET1_R * 0.02, -FILLET1_R))
            Line((-FILLET1_R * 0.02, -FILLET1_R), (-FILLET1_R * 0.02, FILLET1_R * 0.02))
            Line((-FILLET1_R * 0.02, FILLET1_R * 0.02), (FILLET1_R, FILLET1_R * 0.02))
            Line((FILLET1_R, FILLET1_R * 0.02), (FILLET1_R, 0))
        make_face()
    fillet1_piece_17b = extrude(amount=18.375, mode=Mode.PRIVATE)
    fillet1_piece_17b = split(fillet1_piece_17b, bisect_by=Plane(origin=(45.39619145, 45.180339887, 7.60380855), z_dir=(0, 1, 0)), keep=Keep.TOP, mode=Mode.PRIVATE)
    fillet1_piece_17 = fillet1_piece_17a & fillet1_piece_17b
    add(fillet1_piece_17, mode=Mode.SUBTRACT)

    # Sketch3 → Cut-Extrude1 (cut, up to next)
    with BuildSketch(Plane.XZ.offset(2), mode=Mode.PRIVATE) as cut_extrude1_sk1:
        with Locations((35, 6)):
            Rectangle(SKETCH3_W, SKETCH3_H)
    cut_extrude1_tool1 = extrude(cut_extrude1_sk1.sketch, amount=-CUT_EXTRUDE1_REACH, mode=Mode.PRIVATE) & part.part
    add(cut_extrude1_tool1.solids().sort_by_distance((35, -2, 6))[0], mode=Mode.SUBTRACT)


solid = part.part
